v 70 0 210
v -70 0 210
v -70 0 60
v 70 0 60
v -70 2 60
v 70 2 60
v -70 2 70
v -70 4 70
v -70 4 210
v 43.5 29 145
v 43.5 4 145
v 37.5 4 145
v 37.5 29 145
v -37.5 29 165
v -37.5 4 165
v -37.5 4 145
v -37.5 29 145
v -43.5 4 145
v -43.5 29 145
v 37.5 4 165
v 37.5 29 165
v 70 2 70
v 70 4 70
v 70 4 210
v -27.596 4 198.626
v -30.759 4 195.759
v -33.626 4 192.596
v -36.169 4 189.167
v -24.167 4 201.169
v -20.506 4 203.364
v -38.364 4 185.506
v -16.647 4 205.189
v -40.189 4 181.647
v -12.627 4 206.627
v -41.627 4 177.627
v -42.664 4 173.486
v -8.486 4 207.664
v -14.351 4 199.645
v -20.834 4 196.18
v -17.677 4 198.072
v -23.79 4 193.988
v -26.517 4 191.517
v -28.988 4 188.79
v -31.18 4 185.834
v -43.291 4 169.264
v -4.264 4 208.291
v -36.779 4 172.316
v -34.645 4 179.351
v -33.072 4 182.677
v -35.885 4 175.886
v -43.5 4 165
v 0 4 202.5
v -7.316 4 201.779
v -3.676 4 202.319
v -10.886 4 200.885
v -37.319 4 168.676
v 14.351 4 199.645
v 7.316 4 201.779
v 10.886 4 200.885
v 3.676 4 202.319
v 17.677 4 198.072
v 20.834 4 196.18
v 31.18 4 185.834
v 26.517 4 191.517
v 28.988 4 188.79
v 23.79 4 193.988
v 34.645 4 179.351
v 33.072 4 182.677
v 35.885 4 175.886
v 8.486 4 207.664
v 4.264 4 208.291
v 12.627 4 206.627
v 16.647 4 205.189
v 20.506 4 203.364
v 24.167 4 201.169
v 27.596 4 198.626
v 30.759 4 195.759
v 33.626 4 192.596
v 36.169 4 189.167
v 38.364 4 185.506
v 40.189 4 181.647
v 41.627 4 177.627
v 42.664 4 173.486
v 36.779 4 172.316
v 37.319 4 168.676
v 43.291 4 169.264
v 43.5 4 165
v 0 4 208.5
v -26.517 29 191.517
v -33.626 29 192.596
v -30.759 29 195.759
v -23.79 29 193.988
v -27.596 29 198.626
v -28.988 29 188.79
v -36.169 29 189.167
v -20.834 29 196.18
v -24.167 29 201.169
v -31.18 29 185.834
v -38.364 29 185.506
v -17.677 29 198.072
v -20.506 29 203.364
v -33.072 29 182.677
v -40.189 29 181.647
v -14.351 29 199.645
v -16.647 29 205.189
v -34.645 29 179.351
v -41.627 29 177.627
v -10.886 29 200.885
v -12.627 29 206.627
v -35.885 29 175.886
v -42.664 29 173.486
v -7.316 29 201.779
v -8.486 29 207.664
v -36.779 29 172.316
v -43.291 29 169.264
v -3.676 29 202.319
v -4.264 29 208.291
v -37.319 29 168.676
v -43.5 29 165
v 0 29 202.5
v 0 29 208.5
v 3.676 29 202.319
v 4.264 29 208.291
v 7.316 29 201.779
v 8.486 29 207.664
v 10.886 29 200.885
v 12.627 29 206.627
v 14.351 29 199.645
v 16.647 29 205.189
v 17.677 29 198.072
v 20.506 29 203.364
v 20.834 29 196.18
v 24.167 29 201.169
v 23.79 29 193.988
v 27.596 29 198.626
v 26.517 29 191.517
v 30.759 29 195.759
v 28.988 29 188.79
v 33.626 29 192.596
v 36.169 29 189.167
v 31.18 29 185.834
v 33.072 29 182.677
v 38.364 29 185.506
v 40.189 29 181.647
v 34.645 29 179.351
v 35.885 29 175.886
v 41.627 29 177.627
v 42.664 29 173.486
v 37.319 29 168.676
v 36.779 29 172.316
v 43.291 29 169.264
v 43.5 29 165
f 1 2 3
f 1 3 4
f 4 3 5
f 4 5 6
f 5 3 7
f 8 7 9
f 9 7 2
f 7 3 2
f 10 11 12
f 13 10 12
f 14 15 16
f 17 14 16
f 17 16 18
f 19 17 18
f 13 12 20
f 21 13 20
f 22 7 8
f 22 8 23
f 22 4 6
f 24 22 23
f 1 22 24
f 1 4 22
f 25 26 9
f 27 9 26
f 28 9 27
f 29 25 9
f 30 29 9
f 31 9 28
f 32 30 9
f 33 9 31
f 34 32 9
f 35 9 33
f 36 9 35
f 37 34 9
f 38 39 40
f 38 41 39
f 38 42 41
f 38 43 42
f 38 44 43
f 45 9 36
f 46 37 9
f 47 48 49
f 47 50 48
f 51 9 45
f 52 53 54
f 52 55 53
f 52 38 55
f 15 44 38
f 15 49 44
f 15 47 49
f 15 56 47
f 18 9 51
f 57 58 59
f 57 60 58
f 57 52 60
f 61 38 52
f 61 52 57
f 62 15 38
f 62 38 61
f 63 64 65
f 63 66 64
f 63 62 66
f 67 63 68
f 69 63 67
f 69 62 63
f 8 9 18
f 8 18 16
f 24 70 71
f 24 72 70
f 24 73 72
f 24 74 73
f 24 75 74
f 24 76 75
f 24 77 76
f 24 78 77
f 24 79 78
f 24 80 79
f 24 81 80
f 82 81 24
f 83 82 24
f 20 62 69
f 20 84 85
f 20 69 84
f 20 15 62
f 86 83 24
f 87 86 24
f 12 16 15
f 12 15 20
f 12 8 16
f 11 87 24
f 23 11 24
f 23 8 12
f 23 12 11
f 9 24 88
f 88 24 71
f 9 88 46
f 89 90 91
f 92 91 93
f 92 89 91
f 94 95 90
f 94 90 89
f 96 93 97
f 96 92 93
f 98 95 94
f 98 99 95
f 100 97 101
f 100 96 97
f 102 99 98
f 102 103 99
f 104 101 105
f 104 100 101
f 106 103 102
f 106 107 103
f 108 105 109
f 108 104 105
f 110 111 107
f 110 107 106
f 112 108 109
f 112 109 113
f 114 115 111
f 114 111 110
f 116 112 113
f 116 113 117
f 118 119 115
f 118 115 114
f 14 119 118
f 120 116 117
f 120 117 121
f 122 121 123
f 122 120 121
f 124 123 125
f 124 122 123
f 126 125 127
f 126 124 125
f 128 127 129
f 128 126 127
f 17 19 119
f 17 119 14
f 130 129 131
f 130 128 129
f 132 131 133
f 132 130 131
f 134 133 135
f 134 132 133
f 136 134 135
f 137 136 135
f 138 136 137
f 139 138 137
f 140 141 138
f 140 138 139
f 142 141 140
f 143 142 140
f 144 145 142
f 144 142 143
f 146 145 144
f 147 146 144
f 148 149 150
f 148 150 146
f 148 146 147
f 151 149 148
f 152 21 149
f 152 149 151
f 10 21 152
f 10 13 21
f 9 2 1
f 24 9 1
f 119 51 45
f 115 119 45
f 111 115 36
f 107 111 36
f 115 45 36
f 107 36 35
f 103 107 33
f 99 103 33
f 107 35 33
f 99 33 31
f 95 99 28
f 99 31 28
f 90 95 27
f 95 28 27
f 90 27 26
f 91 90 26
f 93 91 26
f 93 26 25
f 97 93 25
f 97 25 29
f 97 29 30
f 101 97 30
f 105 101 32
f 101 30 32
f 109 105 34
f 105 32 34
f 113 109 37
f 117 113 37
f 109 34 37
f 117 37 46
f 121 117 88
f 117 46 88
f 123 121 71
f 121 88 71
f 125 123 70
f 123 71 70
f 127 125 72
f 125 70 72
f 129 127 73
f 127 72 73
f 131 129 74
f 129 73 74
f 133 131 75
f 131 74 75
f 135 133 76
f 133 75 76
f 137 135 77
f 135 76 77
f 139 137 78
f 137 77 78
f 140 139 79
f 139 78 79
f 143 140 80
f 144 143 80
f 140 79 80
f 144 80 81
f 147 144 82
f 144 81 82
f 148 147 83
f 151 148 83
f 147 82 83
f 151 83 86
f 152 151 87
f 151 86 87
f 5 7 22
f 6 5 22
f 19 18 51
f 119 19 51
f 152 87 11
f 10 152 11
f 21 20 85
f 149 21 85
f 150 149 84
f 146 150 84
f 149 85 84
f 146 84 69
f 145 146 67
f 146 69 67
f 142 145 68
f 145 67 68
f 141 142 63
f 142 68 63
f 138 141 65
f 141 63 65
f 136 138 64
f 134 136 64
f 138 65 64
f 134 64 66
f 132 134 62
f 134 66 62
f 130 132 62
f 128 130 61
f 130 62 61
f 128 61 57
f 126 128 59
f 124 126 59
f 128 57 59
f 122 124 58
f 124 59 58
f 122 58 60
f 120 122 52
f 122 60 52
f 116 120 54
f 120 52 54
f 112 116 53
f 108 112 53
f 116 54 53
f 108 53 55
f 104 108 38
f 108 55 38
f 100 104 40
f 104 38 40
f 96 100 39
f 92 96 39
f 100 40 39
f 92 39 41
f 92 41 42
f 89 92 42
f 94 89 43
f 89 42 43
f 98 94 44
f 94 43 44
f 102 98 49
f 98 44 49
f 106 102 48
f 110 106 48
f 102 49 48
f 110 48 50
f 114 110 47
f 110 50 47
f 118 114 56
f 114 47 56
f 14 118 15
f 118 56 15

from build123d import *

# Parameters (mm, degrees)
SKETCH2_W               = 140
SKETCH2_H               = 420
BOSS_EXTRUDE1_DEPTH     = 4
BOSS_EXTRUDE2_DEPTH     = 25
SKETCH4_W               = 10.25
SKETCH4_H               = 80.25
CUT_EXTRUDE1_DEPTH      = 25.4
SKETCH7_W               = 130
SKETCH7_H               = 10
CUT_EXTRUDE2_DEPTH      = 2.45
SKETCH8_W               = 140
SKETCH8_H               = 140
SKETCH8_W_2             = 10.25
SKETCH8_H_2             = 80.25
CUT_EXTRUDE3_DEPTH      = 1
CUT_EXTRUDE3_DEPTH_BACK = 30
SKETCH9_W               = 140
SKETCH9_H               = 10
BOSS_EXTRUDE3_DEPTH     = 2


with BuildPart() as part:
    # Sketch2 → Boss-Extrude1 (new body)
    with BuildSketch(Plane(origin=(0, 0, 0), x_dir=(1, 0, 0), z_dir=(0, 1, 0))):
        Rectangle(SKETCH2_W, SKETCH2_H)
    extrude(amount=BOSS_EXTRUDE1_DEPTH)

    # Sketch3 → Boss-Extrude2 (add)
    with BuildSketch(Plane(origin=(0, 4, 0), x_dir=(1, 0, 0), z_dir=(0, 1, 0))):
        with BuildLine():
            Line((-37.5, -165), (-37.5, -145))
            Line((-37.5, -145), (-43.5, -145))
            Line((-43.5, -145), (-43.5, -165))
            ThreePointArc((-43.5, -165), (0, -208.5), (43.5, -165))
            Line((43.5, -165), (43.5, -145))
            Line((43.5, -145), (37.5, -145))
            Line((37.5, -145), (37.5, -165))
            ThreePointArc((37.5, -165), (0, -202.5), (-37.5, -165))
        make_face()
    extrude(amount=BOSS_EXTRUDE2_DEPTH)

    # Sketch4 → Cut-Extrude1 (cut)
    with BuildSketch(Plane(origin=(0, 4, 0), x_dir=(1, 0, 0), z_dir=(0, 1, 0))):
        with Locations((-59.875, 139.875)):
            Rectangle(SKETCH4_W, SKETCH4_H)
        with Locations((59.875, 139.875)):
            Rectangle(SKETCH4_W, SKETCH4_H)
    extrude(amount=-CUT_EXTRUDE1_DEPTH, mode=Mode.SUBTRACT)

    # Sketch7 → Cut-Extrude2 (cut)
    with BuildSketch(Plane(origin=(0, 4, 0), x_dir=(1, 0, 0), z_dir=(0, 1, 0))):
        with Locations((0, 200)):
            Rectangle(SKETCH7_W, SKETCH7_H)
    extrude(amount=-CUT_EXTRUDE2_DEPTH, mode=Mode.SUBTRACT)

    # Sketch8 → Cut-Extrude3 (cut, two sides)
    with BuildSketch(Plane.XZ) as cut_extrude3_sk:
        with Locations((0, -140)):
            Rectangle(SKETCH8_W, SKETCH8_H)
        with Locations((-59.875, -139.875)):
            Rectangle(SKETCH8_W_2, SKETCH8_H_2, mode=Mode.SUBTRACT)
        with Locations((59.875, -139.875)):
            Rectangle(SKETCH8_W_2, SKETCH8_H_2, mode=Mode.SUBTRACT)
        Rectangle(SKETCH8_W, SKETCH8_H)
    extrude(amount=CUT_EXTRUDE3_DEPTH, mode=Mode.SUBTRACT)
    extrude(cut_extrude3_sk.sketch, amount=-CUT_EXTRUDE3_DEPTH_BACK, mode=Mode.SUBTRACT)

    # Sketch9 → Boss-Extrude3 (add)
    with BuildSketch(Plane.XZ):
        with Locations((0, 65)):
            Rectangle(SKETCH9_W, SKETCH9_H)
    extrude(amount=-BOSS_EXTRUDE3_DEPTH)


solid = part.part
